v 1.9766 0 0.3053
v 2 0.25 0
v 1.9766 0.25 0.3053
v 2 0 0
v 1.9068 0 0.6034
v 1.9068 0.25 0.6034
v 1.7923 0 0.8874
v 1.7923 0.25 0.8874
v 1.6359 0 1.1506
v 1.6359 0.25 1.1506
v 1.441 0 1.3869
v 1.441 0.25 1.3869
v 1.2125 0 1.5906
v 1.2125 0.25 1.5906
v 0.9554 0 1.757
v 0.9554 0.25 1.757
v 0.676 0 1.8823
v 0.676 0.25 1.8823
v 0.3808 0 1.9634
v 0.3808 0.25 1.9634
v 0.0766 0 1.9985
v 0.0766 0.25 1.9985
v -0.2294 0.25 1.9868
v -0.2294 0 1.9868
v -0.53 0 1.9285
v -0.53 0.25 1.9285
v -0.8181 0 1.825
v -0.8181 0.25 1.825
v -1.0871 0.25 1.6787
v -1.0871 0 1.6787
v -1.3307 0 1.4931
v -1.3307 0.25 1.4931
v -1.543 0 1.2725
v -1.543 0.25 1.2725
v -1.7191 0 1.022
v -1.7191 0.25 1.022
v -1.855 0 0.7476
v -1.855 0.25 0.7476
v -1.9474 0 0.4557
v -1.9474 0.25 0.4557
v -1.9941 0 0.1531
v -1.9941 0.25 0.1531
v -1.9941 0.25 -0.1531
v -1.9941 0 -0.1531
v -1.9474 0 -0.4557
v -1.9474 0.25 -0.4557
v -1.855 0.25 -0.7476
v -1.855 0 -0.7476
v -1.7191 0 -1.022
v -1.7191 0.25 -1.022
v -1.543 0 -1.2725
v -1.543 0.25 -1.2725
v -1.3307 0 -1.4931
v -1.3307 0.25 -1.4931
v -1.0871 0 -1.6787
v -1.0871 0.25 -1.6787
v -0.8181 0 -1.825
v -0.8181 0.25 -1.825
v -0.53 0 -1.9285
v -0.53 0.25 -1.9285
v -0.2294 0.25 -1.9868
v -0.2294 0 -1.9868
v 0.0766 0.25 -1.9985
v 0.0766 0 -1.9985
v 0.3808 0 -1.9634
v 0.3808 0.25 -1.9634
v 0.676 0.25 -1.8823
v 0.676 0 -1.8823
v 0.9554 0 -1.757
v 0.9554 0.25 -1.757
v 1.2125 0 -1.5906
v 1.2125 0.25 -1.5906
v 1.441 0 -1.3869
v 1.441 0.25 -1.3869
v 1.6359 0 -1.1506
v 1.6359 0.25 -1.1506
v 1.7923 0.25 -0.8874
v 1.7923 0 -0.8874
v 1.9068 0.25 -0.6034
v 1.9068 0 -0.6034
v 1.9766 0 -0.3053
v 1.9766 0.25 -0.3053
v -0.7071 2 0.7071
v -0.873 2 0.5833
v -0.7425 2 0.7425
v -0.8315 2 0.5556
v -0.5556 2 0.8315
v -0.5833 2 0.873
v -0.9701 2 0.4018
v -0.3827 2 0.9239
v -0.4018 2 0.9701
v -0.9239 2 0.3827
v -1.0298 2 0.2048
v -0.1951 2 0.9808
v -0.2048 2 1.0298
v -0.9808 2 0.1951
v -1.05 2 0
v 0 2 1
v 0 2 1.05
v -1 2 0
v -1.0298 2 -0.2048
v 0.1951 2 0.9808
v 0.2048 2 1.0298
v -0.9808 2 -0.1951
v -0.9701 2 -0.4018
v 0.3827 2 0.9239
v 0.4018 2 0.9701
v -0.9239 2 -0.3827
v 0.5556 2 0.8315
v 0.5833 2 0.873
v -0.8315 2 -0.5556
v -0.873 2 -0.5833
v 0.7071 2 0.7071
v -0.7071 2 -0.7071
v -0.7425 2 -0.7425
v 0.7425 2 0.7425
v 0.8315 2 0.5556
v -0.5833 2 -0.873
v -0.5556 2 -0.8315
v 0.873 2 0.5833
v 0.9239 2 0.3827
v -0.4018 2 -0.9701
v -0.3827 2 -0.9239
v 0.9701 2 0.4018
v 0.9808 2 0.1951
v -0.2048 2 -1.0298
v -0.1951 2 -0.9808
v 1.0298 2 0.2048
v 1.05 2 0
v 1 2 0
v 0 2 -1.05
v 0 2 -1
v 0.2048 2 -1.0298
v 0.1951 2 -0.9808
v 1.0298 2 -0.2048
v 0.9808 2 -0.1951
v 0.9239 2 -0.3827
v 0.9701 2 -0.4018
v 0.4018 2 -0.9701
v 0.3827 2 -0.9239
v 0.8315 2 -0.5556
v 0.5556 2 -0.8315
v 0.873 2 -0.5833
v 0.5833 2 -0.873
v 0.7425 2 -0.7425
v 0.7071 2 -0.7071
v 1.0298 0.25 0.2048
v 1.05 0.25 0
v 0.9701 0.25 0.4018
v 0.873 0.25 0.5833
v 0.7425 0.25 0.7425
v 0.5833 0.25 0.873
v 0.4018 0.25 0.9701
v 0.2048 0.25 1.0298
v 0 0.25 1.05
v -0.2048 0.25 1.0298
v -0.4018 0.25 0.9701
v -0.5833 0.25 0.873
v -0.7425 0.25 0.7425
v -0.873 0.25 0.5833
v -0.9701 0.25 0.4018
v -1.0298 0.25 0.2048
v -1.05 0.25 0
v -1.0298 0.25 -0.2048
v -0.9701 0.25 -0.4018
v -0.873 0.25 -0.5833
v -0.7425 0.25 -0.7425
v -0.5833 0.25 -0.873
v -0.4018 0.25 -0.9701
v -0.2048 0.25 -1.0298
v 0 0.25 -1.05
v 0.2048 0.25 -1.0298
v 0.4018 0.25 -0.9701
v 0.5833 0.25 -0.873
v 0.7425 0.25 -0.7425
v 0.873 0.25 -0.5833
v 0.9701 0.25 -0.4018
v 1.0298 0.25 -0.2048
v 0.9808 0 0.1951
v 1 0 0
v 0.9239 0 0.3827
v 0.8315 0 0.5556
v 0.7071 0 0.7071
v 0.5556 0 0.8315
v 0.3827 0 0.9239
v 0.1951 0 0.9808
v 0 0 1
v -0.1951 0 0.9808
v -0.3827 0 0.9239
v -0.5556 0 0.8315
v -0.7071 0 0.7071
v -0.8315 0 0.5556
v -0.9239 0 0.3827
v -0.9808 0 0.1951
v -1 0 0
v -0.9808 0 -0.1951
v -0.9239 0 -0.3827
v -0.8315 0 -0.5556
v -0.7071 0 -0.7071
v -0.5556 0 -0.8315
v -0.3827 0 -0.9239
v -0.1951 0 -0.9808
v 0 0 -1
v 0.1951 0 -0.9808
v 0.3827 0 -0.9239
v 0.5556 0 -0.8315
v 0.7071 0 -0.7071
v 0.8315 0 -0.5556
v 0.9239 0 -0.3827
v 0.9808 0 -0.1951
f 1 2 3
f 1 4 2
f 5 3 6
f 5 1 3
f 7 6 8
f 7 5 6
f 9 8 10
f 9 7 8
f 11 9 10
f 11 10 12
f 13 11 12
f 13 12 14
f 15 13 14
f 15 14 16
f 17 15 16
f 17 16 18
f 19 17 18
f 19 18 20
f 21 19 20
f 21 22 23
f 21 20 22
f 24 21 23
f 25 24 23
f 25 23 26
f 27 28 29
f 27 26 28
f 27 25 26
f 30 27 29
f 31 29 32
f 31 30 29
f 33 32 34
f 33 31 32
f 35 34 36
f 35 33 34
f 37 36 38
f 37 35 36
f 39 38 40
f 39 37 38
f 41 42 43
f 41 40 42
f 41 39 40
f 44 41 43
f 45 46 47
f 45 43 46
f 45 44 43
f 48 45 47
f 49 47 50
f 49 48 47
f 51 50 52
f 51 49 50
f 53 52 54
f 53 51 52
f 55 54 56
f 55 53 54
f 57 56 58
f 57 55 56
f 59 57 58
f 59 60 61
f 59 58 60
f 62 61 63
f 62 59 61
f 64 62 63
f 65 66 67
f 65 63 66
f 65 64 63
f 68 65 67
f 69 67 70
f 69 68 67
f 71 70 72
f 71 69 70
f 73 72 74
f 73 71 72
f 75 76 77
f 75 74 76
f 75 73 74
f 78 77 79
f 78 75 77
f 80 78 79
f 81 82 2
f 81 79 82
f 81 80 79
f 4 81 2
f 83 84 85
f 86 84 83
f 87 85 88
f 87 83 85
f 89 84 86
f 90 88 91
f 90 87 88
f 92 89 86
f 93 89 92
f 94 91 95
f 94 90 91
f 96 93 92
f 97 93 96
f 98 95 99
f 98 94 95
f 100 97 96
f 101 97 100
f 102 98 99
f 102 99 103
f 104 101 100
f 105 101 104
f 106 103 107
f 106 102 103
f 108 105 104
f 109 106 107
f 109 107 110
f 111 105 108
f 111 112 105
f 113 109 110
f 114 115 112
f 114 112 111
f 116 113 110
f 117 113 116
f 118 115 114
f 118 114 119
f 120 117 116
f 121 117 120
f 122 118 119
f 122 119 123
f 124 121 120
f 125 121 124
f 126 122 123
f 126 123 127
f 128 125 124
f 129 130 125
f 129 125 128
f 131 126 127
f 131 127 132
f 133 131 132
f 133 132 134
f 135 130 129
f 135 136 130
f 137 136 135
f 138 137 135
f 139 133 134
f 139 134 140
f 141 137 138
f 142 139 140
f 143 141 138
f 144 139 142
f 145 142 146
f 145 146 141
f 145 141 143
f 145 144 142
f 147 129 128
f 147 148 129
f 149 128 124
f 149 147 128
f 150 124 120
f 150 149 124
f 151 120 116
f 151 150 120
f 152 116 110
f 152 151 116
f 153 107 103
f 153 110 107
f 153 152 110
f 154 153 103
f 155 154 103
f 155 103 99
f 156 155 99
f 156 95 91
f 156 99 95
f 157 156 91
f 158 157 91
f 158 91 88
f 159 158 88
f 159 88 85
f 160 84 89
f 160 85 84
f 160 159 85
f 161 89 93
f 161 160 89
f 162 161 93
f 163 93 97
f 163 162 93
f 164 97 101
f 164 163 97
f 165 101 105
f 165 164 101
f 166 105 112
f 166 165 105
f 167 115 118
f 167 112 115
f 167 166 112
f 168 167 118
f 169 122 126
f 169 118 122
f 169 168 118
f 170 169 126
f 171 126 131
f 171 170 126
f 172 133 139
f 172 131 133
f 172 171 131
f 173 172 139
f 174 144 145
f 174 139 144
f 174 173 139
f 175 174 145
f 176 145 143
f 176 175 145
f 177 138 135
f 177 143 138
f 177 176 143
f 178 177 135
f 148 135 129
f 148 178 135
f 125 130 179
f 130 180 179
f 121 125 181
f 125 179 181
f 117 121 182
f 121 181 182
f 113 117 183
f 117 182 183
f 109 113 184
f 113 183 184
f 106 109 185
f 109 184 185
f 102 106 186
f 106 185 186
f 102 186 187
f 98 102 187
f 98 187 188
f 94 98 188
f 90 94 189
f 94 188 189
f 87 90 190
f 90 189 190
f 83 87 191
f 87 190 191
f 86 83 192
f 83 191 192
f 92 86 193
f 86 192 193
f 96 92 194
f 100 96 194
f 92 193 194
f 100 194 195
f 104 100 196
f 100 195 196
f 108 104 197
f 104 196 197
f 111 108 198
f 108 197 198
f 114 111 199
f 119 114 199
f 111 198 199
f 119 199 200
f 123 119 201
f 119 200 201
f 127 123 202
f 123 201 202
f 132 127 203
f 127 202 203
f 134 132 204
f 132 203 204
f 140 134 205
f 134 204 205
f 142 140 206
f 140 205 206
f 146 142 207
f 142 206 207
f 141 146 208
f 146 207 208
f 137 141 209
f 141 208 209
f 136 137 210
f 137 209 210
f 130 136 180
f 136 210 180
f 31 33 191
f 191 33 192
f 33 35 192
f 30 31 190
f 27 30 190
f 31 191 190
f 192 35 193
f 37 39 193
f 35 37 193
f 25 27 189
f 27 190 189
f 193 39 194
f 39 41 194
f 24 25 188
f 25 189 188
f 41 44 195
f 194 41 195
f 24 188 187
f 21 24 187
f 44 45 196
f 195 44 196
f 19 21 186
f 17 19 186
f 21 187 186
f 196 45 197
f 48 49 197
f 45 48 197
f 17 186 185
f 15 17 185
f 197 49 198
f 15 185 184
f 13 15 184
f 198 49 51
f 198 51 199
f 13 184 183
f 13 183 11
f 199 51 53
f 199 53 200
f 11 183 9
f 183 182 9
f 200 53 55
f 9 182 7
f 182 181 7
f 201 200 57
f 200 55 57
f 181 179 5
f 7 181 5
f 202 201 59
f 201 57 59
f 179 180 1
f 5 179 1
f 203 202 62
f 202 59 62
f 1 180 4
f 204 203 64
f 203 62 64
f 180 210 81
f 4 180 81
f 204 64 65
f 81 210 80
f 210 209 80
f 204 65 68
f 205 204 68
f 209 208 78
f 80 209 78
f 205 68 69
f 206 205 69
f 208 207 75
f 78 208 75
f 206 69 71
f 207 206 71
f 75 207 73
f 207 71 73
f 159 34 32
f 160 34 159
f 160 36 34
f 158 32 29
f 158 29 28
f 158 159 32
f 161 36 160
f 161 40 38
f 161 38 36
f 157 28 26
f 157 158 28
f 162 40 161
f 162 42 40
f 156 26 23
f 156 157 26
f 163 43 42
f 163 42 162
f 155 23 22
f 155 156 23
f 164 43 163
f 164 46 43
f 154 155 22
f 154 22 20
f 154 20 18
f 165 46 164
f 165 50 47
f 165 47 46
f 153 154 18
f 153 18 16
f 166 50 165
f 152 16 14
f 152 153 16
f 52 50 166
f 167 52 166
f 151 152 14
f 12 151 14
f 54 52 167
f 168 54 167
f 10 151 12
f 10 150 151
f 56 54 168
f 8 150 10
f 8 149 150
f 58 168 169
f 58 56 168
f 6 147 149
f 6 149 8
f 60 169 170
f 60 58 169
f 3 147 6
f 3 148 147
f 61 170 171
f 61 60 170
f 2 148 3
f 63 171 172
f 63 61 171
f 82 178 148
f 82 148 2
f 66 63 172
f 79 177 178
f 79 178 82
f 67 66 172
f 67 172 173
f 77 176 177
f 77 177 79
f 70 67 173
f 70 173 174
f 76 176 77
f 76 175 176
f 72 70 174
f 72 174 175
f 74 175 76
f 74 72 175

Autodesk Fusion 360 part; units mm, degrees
sketch "Sketch1" plane through (0, 0, 0) normal (0, 1, 0) x (1, 0, 0)
  circle A0 centre (0, 0) radius 2
  circle A1 centre (0, 0) radius 1.05
  dimension "d1" = 4
  dimension "d2" = 2.1
extrude "Extrude1" add sketch "Sketch1" along normal blind 0.25
extrude "Extrude2" add sketch "Sketch1" along normal blind 2 contours A1
sketch "Sketch2" plane through (0, 0, 0) normal (0, 1, 0) x (1, 0, 0)
  circle A0 centre (0, 0) radius 1
  dimension "d8" = 2
extrude "Extrude3" cut sketch "Sketch2" along normal blind 3.883
